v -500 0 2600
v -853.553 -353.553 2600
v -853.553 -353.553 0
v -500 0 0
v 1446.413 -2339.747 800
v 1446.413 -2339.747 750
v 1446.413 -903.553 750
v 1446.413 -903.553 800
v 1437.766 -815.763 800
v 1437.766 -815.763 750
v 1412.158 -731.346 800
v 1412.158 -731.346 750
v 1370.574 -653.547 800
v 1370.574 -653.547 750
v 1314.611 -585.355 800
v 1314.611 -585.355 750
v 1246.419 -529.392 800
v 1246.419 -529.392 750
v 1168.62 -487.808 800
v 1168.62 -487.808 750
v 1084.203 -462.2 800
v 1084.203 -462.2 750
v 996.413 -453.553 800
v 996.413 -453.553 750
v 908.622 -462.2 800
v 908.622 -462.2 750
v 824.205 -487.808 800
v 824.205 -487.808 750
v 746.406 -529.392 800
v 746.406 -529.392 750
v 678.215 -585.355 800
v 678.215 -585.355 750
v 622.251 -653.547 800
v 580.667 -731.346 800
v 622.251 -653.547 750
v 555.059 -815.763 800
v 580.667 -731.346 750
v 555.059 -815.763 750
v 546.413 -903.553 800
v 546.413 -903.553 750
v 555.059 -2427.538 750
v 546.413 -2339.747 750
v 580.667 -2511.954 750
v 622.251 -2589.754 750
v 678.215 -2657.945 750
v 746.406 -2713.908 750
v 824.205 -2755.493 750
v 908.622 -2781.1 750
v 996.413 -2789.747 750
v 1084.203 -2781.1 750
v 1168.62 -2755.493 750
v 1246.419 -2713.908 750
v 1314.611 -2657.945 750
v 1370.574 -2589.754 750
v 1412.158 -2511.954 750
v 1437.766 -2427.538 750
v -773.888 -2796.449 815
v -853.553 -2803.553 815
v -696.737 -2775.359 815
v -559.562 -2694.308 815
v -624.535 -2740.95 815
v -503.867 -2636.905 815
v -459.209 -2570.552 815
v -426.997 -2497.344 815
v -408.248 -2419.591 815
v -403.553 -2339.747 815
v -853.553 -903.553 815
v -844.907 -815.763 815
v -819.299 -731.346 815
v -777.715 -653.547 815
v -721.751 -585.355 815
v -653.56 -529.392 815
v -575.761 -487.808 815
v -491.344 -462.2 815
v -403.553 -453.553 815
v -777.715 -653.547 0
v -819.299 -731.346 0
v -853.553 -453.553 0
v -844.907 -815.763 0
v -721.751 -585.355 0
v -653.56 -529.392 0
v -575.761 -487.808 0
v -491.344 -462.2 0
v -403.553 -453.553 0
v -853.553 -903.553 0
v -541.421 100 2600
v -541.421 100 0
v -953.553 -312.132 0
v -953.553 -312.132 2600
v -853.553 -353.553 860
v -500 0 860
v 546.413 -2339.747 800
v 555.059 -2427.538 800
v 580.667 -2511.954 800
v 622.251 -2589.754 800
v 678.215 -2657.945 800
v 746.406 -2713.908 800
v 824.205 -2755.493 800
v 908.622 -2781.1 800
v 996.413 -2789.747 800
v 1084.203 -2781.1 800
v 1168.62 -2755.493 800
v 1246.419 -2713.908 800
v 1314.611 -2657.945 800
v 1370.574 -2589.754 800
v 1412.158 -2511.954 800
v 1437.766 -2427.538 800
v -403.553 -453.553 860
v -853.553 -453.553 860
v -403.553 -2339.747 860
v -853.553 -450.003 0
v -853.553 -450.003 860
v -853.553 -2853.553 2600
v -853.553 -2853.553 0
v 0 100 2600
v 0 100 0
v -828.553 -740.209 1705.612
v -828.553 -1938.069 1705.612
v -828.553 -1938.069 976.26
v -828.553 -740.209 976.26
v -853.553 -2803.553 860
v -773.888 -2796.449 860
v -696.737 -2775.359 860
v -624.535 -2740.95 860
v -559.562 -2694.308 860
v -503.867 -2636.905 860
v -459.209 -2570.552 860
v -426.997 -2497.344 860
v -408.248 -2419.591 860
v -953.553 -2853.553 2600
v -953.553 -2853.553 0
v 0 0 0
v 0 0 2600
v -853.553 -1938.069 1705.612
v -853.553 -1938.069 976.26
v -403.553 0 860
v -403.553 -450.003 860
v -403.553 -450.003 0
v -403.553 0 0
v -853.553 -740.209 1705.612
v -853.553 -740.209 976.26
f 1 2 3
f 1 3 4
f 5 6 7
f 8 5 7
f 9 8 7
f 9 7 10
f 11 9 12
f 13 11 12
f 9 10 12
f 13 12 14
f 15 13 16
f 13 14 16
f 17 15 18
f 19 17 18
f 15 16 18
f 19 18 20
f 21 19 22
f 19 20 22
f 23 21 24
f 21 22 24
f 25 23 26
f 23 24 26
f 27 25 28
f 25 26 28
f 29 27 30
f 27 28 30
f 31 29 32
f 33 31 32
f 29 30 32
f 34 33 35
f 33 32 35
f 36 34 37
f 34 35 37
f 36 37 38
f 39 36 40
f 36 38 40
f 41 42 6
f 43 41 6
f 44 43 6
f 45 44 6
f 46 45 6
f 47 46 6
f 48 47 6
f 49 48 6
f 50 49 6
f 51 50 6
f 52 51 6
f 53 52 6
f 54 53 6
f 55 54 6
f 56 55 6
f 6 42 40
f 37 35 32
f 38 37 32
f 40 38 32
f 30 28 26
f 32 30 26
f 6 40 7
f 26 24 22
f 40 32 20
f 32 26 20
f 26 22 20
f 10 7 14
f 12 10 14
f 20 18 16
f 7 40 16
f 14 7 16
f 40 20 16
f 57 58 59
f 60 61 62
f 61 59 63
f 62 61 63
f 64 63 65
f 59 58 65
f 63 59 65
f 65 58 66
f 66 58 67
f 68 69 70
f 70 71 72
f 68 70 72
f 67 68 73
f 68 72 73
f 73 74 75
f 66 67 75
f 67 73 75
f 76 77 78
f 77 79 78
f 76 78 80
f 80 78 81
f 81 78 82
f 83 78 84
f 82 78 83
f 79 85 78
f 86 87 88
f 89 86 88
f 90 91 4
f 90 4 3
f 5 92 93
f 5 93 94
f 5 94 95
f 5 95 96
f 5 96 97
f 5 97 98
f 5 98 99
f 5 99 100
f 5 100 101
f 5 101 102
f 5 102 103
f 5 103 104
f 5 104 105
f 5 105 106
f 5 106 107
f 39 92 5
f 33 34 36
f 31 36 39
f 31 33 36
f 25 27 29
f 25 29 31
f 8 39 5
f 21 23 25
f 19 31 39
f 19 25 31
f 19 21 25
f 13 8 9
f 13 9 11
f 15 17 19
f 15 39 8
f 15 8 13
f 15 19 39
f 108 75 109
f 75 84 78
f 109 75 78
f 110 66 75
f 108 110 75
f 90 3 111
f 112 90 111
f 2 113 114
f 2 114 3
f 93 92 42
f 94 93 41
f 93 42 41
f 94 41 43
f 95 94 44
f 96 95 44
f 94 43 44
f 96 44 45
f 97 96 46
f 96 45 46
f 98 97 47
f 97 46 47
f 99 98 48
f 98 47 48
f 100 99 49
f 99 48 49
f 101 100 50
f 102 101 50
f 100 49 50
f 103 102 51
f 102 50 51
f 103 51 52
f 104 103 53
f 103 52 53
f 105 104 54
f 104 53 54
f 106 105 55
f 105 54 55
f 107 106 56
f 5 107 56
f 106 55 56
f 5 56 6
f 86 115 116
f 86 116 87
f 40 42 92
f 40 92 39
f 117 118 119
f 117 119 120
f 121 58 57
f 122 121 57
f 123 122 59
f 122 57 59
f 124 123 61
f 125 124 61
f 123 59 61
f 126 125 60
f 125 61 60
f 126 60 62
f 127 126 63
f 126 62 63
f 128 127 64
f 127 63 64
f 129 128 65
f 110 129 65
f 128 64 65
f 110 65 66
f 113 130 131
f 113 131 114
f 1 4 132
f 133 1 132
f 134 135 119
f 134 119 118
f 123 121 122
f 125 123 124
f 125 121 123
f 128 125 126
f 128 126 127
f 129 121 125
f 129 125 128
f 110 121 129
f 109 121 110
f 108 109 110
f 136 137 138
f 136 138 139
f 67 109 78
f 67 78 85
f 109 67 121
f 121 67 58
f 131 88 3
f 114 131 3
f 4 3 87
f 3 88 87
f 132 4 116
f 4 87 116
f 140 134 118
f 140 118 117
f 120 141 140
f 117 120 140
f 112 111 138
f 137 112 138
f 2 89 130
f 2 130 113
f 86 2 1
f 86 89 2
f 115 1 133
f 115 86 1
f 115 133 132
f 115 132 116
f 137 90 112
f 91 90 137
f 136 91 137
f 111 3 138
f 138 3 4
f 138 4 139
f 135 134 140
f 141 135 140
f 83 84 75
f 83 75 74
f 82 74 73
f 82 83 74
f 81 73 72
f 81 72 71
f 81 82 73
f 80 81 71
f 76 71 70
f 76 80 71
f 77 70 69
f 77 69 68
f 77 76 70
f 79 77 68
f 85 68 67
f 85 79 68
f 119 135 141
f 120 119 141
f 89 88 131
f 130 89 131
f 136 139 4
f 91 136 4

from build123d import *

# Parameters (mm, degrees)
F1_DEPTH = 2600
F2_DEPTH = 860
F0_W     = 450
F0_H     = 1436.1935516499
F3_DEPTH = 800
F4_DEPTH = 815
F5_DEPTH = 750
F6_W     = 1197.8597640991
F6_H     = 729.3516397476
F7_DEPTH = 25


with BuildPart() as f1:
    # F0 (on Top) → F1 (new body)
    with BuildSketch(Plane.XY):
        Polygon((-403.5533905933, 0), (0, 0), (0, 100), (-541.4213562373, 100), (-953.5533905933, -312.132034356), (-953.5533905933, -2853.5533905933), (-853.5533905933, -2853.5533905933), (-853.5533905933, -2803.5533905933), (-853.5533905933, -1614.7469422431), (-853.5533905933, -903.5533905933), (-853.5533905933, -453.5533905933), (-853.5533905933, -450.0033905933), (-853.5533905933, -353.5533905933), (-500, 0), align=None)
    extrude(amount=F1_DEPTH)


with BuildPart() as f2:
    # F0 (on Top) → F2 (new body)
    with BuildSketch(Plane.XY):
        Polygon((-403.5533905933, -450.0033905933), (-403.5533905933, 0), (-500, 0), (-853.5533905933, -353.5533905933), (-853.5533905933, -450.0033905933), align=None)
    extrude(amount=F2_DEPTH)


with BuildPart() as f2b:
    # F0 (on Top) → F2, piece 2 (new body)
    with BuildSketch(Plane.XY):
        with BuildLine():
            Line((-403.5533905933, -453.5533905933), (-853.5533905933, -453.5533905933))
            Line((-853.5533905933, -453.5533905933), (-853.5533905933, -903.5533905933))
            ThreePointArc((-853.5533905933, -903.5533905933), (-721.7514421272, -585.3553390593), (-403.5533905933, -453.5533905933))
        make_face()
        with BuildLine():
            ThreePointArc((-403.5533905933, -453.5533905933), (-721.7514421272, -585.3553390593), (-853.5533905933, -903.5533905933))
            Line((-853.5533905933, -903.5533905933), (-853.5533905933, -1614.7469422431))
            Line((-853.5533905933, -1614.7469422431), (-403.5533905933, -1614.7469422431))
            Line((-403.5533905933, -1614.7469422431), (-403.5533905933, -453.5533905933))
        make_face()
        with BuildLine():
            Line((-403.5533905933, -1614.7469422431), (-853.5533905933, -1614.7469422431))
            Line((-853.5533905933, -1614.7469422431), (-853.5533905933, -2803.5533905933))
            ThreePointArc((-853.5533905933, -2803.5533905933), (-530.4371493073, -2666.845713474), (-403.5533905933, -2339.7469422432))
            Line((-403.5533905933, -2339.7469422432), (-403.5533905933, -1614.7469422431))
        make_face()
    extrude(amount=F2_DEPTH)

    # F0 (on Top) → F4 (cut)
    with BuildSketch(Plane.XY):
        with BuildLine():
            Line((-403.5533905933, -1614.7469422431), (-853.5533905933, -1614.7469422431))
            Line((-853.5533905933, -1614.7469422431), (-853.5533905933, -2803.5533905933))
            ThreePointArc((-853.5533905933, -2803.5533905933), (-530.4371493073, -2666.845713474), (-403.5533905933, -2339.7469422432))
            Line((-403.5533905933, -2339.7469422432), (-403.5533905933, -1614.7469422431))
        make_face()
        with BuildLine():
            ThreePointArc((-403.5533905933, -453.5533905933), (-721.7514421272, -585.3553390593), (-853.5533905933, -903.5533905933))
            Line((-853.5533905933, -903.5533905933), (-853.5533905933, -1614.7469422431))
            Line((-853.5533905933, -1614.7469422431), (-403.5533905933, -1614.7469422431))
            Line((-403.5533905933, -1614.7469422431), (-403.5533905933, -453.5533905933))
        make_face()
    extrude(amount=F4_DEPTH, mode=Mode.SUBTRACT)


with BuildPart() as f3:
    # F0 (on Top) → F3 (new body)
    with BuildSketch(Plane.XY):
        with BuildLine():
            Line((996.4127063751, -453.5533905933), (996.4127063751, -903.5533905933))
            Line((996.4127063751, -903.5533905933), (996.4127063751, -2339.7469422431))
            Line((996.4127063751, -2339.7469422432), (996.4127063751, -2789.7469422432))
            ThreePointArc((996.4127063751, -2789.7469422432), (1314.6107579091, -2657.9449937771), (1446.4127063751, -2339.7469422432))
            Line((1446.4127063751, -2339.7469422432), (1446.4127063751, -903.5533905933))
            ThreePointArc((1446.4127063751, -903.5533905933), (1314.6107579091, -585.3553390593), (996.4127063751, -453.5533905933))
        make_face()
        with Locations((771.4127063751, -1621.6501664182)):
            Rectangle(F0_W, F0_H)
        with BuildLine():
            Line((546.4127063751, -903.5533905933), (996.4127063751, -903.5533905933))
            Line((996.4127063751, -903.5533905933), (996.4127063751, -453.5533905933))
            ThreePointArc((996.4127063751, -453.5533905933), (678.2146548412, -585.3553390593), (546.4127063751, -903.5533905933))
        make_face()
        with BuildLine():
            Line((996.4127063751, -2789.7469422432), (996.4127063751, -2339.7469422432))
            Line((996.4127063751, -2339.7469422432), (546.4127063751, -2339.7469422432))
            ThreePointArc((546.4127063751, -2339.7469422432), (678.2146548412, -2657.9449937771), (996.4127063751, -2789.7469422432))
        make_face()
    extrude(amount=F3_DEPTH)

    # F0 (on Top) → F5 (cut)
    with BuildSketch(Plane.XY):
        with Locations((771.4127063751, -1621.6501664182)):
            Rectangle(F0_W, F0_H)
        with BuildLine():
            Line((996.4127063751, -453.5533905933), (996.4127063751, -903.5533905933))
            Line((996.4127063751, -903.5533905933), (996.4127063751, -2339.7469422431))
            Line((996.4127063751, -2339.7469422432), (996.4127063751, -2789.7469422432))
            ThreePointArc((996.4127063751, -2789.7469422432), (1314.6107579091, -2657.9449937771), (1446.4127063751, -2339.7469422432))
            Line((1446.4127063751, -2339.7469422432), (1446.4127063751, -903.5533905933))
            ThreePointArc((1446.4127063751, -903.5533905933), (1314.6107579091, -585.3553390593), (996.4127063751, -453.5533905933))
        make_face()
        with BuildLine():
            Line((996.4127063751, -2789.7469422432), (996.4127063751, -2339.7469422432))
            Line((996.4127063751, -2339.7469422432), (546.4127063751, -2339.7469422432))
            ThreePointArc((546.4127063751, -2339.7469422432), (678.2146548412, -2657.9449937771), (996.4127063751, -2789.7469422432))
        make_face()
        with BuildLine():
            Line((546.4127063751, -903.5533905933), (996.4127063751, -903.5533905933))
            Line((996.4127063751, -903.5533905933), (996.4127063751, -453.5533905933))
            ThreePointArc((996.4127063751, -453.5533905933), (678.2146548412, -585.3553390593), (546.4127063751, -903.5533905933))
        make_face()
    extrude(amount=F5_DEPTH, mode=Mode.SUBTRACT)


with BuildPart() as f7:
    # F6 (on face) → F7 (new body)
    with BuildSketch(Plane.YZ.offset(-853.5533905933)):
        with Locations((-1339.139342308, 1340.9360051155)):
            Rectangle(F6_W, F6_H)
    extrude(amount=F7_DEPTH)


solid = Compound([f1.part, f2.part, f2b.part, f3.part, f7.part])
